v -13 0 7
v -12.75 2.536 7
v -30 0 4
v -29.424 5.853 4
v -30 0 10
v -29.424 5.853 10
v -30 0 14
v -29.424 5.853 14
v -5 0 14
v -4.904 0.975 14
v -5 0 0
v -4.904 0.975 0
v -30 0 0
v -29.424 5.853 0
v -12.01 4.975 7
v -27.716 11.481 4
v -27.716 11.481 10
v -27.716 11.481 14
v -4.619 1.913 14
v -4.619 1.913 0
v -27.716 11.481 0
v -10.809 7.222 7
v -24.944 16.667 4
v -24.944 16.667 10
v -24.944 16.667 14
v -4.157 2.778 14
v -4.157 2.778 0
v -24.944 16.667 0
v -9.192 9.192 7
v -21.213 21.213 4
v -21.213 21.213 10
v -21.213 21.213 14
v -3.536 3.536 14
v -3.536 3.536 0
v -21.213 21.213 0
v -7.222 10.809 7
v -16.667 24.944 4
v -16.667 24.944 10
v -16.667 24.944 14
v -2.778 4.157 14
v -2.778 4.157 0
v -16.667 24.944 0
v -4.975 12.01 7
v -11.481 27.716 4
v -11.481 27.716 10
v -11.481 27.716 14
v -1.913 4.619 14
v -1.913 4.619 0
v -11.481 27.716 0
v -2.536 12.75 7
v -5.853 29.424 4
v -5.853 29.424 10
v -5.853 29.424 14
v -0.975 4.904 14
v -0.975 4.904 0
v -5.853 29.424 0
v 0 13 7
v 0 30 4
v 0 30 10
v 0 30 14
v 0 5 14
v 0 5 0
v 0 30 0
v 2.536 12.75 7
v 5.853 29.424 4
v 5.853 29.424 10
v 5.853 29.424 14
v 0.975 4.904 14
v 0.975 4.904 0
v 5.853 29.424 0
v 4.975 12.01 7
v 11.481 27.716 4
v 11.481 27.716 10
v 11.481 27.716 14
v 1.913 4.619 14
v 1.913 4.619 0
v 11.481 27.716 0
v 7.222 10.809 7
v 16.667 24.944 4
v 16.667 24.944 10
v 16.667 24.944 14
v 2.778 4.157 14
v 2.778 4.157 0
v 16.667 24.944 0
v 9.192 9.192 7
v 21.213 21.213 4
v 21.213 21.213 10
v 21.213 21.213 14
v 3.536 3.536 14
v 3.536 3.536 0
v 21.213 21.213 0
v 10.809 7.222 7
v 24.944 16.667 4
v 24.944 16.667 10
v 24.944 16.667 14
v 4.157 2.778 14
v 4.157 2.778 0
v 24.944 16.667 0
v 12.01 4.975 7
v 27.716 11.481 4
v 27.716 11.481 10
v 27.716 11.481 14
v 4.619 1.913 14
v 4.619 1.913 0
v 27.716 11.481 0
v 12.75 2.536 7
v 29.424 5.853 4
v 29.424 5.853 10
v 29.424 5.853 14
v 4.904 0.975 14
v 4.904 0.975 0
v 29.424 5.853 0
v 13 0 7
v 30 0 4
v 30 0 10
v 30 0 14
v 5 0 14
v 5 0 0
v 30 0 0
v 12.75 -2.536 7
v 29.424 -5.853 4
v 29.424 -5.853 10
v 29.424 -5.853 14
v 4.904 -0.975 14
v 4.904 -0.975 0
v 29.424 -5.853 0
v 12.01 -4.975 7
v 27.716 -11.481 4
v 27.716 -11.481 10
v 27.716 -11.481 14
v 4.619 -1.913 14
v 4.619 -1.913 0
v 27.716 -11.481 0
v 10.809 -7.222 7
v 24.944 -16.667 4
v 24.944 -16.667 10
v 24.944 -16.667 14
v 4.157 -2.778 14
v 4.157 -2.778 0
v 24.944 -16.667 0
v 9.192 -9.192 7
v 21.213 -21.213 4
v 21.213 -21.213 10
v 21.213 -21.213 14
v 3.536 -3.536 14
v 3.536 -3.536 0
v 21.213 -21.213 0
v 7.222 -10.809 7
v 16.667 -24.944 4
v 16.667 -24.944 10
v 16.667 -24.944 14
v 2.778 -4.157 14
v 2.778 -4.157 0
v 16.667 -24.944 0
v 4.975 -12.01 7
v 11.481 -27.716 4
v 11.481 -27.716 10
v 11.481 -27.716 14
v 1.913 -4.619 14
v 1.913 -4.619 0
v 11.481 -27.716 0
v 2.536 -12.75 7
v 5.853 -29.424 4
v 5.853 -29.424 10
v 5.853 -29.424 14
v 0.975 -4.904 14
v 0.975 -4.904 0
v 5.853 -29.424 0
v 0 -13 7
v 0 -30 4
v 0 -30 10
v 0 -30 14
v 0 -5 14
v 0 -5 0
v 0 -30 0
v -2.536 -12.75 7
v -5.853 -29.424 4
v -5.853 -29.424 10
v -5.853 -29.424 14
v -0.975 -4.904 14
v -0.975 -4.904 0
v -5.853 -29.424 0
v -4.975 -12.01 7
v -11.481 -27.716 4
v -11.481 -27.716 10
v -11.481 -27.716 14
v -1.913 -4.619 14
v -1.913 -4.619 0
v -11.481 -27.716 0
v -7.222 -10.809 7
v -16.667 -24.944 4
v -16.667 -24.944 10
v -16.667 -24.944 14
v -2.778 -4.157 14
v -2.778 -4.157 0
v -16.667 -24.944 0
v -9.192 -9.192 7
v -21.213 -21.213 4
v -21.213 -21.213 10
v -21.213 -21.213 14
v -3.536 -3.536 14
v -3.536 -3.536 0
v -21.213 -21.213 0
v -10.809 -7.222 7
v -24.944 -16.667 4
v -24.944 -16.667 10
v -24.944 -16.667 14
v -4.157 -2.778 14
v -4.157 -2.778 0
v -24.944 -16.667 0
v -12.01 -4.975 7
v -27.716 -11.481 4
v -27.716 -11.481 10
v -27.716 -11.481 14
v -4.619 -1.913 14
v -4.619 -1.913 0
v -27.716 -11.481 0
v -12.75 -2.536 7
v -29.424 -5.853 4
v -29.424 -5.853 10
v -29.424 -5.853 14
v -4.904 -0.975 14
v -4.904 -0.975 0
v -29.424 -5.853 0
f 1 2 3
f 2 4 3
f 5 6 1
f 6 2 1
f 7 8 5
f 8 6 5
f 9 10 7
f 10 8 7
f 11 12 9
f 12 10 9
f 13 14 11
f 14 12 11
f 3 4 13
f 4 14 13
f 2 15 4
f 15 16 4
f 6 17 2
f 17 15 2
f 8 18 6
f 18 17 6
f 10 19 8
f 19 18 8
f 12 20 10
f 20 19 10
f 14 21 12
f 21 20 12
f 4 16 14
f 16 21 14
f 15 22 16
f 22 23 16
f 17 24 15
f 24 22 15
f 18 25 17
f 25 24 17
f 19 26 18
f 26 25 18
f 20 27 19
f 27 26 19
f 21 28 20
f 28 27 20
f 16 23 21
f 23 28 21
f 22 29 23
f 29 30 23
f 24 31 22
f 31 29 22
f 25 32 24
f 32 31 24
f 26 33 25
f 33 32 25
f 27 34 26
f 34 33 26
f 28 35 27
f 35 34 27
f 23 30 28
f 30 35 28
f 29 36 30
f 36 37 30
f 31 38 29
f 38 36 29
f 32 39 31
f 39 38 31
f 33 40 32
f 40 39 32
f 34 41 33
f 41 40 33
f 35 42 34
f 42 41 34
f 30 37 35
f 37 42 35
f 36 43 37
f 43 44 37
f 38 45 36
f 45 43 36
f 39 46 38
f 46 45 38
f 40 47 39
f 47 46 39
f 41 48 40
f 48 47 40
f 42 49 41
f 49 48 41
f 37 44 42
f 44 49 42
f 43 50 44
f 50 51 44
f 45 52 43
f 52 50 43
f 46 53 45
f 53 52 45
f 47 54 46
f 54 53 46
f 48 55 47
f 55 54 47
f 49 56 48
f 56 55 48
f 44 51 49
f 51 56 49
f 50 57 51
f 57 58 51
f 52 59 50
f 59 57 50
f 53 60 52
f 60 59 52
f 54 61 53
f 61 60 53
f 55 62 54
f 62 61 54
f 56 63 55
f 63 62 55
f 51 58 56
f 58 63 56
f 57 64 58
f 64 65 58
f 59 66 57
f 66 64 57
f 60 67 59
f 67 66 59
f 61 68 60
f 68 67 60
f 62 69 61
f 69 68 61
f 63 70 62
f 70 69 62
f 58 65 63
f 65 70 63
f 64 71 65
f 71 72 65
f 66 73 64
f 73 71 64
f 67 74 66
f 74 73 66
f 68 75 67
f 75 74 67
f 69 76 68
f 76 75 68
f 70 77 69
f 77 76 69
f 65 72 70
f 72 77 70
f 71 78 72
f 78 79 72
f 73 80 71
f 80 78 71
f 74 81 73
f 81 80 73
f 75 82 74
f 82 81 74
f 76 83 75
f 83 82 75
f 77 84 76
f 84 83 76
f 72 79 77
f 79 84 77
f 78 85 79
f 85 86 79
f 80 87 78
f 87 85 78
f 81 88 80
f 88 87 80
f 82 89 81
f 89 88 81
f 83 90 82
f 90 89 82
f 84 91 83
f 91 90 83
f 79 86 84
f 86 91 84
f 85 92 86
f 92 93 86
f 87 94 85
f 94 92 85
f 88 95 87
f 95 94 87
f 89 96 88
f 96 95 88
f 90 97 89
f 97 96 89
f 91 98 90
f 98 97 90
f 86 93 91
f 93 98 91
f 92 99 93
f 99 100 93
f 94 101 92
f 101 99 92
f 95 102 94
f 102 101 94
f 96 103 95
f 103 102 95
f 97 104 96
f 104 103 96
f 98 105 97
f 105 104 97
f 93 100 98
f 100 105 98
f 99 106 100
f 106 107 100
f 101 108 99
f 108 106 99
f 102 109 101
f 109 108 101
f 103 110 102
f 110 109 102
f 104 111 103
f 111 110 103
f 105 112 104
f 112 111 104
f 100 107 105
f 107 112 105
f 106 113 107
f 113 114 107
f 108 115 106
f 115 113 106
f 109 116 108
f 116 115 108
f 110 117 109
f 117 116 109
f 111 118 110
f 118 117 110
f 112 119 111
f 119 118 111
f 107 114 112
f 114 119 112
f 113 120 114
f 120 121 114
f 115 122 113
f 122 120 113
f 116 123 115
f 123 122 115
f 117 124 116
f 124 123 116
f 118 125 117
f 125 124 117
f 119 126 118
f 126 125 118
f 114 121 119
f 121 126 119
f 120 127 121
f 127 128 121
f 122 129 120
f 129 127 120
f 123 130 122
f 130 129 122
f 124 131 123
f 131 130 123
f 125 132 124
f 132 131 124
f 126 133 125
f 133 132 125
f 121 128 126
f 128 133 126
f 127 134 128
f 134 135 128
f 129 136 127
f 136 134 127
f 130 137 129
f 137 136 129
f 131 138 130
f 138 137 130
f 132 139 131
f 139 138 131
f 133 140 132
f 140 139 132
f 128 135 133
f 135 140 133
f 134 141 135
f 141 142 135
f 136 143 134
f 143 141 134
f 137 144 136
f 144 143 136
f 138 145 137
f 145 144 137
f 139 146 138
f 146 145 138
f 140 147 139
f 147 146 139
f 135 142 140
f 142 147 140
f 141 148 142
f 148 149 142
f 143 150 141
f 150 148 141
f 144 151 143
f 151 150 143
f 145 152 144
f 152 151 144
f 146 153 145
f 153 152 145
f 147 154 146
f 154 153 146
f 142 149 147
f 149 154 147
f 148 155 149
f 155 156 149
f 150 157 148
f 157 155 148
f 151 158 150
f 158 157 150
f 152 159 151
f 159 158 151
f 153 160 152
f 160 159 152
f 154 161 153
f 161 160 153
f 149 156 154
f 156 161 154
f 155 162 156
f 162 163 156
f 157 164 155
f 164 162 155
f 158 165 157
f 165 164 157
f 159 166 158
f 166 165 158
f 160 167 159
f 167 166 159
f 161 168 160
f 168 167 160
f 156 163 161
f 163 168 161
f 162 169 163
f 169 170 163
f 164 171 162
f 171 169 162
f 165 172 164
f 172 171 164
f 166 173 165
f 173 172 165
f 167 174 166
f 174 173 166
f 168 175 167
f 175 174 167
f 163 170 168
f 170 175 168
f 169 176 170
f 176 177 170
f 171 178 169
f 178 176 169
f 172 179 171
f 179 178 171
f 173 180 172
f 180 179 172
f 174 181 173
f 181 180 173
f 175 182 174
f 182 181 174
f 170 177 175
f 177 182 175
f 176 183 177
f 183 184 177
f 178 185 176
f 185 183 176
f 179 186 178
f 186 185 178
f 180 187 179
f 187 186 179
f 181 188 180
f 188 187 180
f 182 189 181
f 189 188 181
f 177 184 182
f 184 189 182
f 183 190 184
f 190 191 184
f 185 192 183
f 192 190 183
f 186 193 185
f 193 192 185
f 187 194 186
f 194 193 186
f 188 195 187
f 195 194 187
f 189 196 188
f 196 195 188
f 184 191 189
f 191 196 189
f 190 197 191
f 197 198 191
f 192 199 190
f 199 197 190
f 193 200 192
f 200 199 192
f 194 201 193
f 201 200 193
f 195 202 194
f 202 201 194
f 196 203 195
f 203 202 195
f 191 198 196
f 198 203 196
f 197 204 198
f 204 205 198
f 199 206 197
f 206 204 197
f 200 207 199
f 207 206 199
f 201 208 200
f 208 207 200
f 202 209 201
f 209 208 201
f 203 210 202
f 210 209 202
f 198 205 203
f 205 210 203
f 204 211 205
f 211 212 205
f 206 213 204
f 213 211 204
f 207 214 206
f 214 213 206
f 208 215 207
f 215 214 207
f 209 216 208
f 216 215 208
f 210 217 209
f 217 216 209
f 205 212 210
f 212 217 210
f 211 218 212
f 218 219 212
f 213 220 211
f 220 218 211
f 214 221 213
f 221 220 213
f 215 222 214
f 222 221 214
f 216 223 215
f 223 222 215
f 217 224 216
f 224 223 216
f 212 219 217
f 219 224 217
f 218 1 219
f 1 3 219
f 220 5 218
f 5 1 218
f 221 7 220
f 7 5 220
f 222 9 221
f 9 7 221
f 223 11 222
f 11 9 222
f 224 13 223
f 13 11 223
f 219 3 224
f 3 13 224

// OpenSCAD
$fn = 32;

// ----------------------------------------------------------------------
// Revolved part: V-groove pulley R30
// ----------------------------------------------------------------------

// --- parameters (mm) ---
bore_r = 5;               // bore radius
rim_r = 30;               // rim radius
rim_t = 14;               // rim width
groove_r = 13;            // groove root radius
groove_w = 3;             // groove half width
revolve_angle = 360;      // revolve sweep, degrees
fit_tol = 0.1;            // declared fit tolerance (prompt contract)
free_tol = 0.5;           // declared free tolerance (prompt contract)

bore_d = 2 * bore_r;
rim_d = 2 * rim_r;
groove_d = 2 * groove_r;

profile = [[5, 0], [30, 0], [30, 4], [13, 7], [30, 10], [30, 14], [5, 14]];  // primary outline, 7 points, counter clockwise

// --- the one profile operation ---
rotate_extrude(angle = revolve_angle) polygon(points = profile);
